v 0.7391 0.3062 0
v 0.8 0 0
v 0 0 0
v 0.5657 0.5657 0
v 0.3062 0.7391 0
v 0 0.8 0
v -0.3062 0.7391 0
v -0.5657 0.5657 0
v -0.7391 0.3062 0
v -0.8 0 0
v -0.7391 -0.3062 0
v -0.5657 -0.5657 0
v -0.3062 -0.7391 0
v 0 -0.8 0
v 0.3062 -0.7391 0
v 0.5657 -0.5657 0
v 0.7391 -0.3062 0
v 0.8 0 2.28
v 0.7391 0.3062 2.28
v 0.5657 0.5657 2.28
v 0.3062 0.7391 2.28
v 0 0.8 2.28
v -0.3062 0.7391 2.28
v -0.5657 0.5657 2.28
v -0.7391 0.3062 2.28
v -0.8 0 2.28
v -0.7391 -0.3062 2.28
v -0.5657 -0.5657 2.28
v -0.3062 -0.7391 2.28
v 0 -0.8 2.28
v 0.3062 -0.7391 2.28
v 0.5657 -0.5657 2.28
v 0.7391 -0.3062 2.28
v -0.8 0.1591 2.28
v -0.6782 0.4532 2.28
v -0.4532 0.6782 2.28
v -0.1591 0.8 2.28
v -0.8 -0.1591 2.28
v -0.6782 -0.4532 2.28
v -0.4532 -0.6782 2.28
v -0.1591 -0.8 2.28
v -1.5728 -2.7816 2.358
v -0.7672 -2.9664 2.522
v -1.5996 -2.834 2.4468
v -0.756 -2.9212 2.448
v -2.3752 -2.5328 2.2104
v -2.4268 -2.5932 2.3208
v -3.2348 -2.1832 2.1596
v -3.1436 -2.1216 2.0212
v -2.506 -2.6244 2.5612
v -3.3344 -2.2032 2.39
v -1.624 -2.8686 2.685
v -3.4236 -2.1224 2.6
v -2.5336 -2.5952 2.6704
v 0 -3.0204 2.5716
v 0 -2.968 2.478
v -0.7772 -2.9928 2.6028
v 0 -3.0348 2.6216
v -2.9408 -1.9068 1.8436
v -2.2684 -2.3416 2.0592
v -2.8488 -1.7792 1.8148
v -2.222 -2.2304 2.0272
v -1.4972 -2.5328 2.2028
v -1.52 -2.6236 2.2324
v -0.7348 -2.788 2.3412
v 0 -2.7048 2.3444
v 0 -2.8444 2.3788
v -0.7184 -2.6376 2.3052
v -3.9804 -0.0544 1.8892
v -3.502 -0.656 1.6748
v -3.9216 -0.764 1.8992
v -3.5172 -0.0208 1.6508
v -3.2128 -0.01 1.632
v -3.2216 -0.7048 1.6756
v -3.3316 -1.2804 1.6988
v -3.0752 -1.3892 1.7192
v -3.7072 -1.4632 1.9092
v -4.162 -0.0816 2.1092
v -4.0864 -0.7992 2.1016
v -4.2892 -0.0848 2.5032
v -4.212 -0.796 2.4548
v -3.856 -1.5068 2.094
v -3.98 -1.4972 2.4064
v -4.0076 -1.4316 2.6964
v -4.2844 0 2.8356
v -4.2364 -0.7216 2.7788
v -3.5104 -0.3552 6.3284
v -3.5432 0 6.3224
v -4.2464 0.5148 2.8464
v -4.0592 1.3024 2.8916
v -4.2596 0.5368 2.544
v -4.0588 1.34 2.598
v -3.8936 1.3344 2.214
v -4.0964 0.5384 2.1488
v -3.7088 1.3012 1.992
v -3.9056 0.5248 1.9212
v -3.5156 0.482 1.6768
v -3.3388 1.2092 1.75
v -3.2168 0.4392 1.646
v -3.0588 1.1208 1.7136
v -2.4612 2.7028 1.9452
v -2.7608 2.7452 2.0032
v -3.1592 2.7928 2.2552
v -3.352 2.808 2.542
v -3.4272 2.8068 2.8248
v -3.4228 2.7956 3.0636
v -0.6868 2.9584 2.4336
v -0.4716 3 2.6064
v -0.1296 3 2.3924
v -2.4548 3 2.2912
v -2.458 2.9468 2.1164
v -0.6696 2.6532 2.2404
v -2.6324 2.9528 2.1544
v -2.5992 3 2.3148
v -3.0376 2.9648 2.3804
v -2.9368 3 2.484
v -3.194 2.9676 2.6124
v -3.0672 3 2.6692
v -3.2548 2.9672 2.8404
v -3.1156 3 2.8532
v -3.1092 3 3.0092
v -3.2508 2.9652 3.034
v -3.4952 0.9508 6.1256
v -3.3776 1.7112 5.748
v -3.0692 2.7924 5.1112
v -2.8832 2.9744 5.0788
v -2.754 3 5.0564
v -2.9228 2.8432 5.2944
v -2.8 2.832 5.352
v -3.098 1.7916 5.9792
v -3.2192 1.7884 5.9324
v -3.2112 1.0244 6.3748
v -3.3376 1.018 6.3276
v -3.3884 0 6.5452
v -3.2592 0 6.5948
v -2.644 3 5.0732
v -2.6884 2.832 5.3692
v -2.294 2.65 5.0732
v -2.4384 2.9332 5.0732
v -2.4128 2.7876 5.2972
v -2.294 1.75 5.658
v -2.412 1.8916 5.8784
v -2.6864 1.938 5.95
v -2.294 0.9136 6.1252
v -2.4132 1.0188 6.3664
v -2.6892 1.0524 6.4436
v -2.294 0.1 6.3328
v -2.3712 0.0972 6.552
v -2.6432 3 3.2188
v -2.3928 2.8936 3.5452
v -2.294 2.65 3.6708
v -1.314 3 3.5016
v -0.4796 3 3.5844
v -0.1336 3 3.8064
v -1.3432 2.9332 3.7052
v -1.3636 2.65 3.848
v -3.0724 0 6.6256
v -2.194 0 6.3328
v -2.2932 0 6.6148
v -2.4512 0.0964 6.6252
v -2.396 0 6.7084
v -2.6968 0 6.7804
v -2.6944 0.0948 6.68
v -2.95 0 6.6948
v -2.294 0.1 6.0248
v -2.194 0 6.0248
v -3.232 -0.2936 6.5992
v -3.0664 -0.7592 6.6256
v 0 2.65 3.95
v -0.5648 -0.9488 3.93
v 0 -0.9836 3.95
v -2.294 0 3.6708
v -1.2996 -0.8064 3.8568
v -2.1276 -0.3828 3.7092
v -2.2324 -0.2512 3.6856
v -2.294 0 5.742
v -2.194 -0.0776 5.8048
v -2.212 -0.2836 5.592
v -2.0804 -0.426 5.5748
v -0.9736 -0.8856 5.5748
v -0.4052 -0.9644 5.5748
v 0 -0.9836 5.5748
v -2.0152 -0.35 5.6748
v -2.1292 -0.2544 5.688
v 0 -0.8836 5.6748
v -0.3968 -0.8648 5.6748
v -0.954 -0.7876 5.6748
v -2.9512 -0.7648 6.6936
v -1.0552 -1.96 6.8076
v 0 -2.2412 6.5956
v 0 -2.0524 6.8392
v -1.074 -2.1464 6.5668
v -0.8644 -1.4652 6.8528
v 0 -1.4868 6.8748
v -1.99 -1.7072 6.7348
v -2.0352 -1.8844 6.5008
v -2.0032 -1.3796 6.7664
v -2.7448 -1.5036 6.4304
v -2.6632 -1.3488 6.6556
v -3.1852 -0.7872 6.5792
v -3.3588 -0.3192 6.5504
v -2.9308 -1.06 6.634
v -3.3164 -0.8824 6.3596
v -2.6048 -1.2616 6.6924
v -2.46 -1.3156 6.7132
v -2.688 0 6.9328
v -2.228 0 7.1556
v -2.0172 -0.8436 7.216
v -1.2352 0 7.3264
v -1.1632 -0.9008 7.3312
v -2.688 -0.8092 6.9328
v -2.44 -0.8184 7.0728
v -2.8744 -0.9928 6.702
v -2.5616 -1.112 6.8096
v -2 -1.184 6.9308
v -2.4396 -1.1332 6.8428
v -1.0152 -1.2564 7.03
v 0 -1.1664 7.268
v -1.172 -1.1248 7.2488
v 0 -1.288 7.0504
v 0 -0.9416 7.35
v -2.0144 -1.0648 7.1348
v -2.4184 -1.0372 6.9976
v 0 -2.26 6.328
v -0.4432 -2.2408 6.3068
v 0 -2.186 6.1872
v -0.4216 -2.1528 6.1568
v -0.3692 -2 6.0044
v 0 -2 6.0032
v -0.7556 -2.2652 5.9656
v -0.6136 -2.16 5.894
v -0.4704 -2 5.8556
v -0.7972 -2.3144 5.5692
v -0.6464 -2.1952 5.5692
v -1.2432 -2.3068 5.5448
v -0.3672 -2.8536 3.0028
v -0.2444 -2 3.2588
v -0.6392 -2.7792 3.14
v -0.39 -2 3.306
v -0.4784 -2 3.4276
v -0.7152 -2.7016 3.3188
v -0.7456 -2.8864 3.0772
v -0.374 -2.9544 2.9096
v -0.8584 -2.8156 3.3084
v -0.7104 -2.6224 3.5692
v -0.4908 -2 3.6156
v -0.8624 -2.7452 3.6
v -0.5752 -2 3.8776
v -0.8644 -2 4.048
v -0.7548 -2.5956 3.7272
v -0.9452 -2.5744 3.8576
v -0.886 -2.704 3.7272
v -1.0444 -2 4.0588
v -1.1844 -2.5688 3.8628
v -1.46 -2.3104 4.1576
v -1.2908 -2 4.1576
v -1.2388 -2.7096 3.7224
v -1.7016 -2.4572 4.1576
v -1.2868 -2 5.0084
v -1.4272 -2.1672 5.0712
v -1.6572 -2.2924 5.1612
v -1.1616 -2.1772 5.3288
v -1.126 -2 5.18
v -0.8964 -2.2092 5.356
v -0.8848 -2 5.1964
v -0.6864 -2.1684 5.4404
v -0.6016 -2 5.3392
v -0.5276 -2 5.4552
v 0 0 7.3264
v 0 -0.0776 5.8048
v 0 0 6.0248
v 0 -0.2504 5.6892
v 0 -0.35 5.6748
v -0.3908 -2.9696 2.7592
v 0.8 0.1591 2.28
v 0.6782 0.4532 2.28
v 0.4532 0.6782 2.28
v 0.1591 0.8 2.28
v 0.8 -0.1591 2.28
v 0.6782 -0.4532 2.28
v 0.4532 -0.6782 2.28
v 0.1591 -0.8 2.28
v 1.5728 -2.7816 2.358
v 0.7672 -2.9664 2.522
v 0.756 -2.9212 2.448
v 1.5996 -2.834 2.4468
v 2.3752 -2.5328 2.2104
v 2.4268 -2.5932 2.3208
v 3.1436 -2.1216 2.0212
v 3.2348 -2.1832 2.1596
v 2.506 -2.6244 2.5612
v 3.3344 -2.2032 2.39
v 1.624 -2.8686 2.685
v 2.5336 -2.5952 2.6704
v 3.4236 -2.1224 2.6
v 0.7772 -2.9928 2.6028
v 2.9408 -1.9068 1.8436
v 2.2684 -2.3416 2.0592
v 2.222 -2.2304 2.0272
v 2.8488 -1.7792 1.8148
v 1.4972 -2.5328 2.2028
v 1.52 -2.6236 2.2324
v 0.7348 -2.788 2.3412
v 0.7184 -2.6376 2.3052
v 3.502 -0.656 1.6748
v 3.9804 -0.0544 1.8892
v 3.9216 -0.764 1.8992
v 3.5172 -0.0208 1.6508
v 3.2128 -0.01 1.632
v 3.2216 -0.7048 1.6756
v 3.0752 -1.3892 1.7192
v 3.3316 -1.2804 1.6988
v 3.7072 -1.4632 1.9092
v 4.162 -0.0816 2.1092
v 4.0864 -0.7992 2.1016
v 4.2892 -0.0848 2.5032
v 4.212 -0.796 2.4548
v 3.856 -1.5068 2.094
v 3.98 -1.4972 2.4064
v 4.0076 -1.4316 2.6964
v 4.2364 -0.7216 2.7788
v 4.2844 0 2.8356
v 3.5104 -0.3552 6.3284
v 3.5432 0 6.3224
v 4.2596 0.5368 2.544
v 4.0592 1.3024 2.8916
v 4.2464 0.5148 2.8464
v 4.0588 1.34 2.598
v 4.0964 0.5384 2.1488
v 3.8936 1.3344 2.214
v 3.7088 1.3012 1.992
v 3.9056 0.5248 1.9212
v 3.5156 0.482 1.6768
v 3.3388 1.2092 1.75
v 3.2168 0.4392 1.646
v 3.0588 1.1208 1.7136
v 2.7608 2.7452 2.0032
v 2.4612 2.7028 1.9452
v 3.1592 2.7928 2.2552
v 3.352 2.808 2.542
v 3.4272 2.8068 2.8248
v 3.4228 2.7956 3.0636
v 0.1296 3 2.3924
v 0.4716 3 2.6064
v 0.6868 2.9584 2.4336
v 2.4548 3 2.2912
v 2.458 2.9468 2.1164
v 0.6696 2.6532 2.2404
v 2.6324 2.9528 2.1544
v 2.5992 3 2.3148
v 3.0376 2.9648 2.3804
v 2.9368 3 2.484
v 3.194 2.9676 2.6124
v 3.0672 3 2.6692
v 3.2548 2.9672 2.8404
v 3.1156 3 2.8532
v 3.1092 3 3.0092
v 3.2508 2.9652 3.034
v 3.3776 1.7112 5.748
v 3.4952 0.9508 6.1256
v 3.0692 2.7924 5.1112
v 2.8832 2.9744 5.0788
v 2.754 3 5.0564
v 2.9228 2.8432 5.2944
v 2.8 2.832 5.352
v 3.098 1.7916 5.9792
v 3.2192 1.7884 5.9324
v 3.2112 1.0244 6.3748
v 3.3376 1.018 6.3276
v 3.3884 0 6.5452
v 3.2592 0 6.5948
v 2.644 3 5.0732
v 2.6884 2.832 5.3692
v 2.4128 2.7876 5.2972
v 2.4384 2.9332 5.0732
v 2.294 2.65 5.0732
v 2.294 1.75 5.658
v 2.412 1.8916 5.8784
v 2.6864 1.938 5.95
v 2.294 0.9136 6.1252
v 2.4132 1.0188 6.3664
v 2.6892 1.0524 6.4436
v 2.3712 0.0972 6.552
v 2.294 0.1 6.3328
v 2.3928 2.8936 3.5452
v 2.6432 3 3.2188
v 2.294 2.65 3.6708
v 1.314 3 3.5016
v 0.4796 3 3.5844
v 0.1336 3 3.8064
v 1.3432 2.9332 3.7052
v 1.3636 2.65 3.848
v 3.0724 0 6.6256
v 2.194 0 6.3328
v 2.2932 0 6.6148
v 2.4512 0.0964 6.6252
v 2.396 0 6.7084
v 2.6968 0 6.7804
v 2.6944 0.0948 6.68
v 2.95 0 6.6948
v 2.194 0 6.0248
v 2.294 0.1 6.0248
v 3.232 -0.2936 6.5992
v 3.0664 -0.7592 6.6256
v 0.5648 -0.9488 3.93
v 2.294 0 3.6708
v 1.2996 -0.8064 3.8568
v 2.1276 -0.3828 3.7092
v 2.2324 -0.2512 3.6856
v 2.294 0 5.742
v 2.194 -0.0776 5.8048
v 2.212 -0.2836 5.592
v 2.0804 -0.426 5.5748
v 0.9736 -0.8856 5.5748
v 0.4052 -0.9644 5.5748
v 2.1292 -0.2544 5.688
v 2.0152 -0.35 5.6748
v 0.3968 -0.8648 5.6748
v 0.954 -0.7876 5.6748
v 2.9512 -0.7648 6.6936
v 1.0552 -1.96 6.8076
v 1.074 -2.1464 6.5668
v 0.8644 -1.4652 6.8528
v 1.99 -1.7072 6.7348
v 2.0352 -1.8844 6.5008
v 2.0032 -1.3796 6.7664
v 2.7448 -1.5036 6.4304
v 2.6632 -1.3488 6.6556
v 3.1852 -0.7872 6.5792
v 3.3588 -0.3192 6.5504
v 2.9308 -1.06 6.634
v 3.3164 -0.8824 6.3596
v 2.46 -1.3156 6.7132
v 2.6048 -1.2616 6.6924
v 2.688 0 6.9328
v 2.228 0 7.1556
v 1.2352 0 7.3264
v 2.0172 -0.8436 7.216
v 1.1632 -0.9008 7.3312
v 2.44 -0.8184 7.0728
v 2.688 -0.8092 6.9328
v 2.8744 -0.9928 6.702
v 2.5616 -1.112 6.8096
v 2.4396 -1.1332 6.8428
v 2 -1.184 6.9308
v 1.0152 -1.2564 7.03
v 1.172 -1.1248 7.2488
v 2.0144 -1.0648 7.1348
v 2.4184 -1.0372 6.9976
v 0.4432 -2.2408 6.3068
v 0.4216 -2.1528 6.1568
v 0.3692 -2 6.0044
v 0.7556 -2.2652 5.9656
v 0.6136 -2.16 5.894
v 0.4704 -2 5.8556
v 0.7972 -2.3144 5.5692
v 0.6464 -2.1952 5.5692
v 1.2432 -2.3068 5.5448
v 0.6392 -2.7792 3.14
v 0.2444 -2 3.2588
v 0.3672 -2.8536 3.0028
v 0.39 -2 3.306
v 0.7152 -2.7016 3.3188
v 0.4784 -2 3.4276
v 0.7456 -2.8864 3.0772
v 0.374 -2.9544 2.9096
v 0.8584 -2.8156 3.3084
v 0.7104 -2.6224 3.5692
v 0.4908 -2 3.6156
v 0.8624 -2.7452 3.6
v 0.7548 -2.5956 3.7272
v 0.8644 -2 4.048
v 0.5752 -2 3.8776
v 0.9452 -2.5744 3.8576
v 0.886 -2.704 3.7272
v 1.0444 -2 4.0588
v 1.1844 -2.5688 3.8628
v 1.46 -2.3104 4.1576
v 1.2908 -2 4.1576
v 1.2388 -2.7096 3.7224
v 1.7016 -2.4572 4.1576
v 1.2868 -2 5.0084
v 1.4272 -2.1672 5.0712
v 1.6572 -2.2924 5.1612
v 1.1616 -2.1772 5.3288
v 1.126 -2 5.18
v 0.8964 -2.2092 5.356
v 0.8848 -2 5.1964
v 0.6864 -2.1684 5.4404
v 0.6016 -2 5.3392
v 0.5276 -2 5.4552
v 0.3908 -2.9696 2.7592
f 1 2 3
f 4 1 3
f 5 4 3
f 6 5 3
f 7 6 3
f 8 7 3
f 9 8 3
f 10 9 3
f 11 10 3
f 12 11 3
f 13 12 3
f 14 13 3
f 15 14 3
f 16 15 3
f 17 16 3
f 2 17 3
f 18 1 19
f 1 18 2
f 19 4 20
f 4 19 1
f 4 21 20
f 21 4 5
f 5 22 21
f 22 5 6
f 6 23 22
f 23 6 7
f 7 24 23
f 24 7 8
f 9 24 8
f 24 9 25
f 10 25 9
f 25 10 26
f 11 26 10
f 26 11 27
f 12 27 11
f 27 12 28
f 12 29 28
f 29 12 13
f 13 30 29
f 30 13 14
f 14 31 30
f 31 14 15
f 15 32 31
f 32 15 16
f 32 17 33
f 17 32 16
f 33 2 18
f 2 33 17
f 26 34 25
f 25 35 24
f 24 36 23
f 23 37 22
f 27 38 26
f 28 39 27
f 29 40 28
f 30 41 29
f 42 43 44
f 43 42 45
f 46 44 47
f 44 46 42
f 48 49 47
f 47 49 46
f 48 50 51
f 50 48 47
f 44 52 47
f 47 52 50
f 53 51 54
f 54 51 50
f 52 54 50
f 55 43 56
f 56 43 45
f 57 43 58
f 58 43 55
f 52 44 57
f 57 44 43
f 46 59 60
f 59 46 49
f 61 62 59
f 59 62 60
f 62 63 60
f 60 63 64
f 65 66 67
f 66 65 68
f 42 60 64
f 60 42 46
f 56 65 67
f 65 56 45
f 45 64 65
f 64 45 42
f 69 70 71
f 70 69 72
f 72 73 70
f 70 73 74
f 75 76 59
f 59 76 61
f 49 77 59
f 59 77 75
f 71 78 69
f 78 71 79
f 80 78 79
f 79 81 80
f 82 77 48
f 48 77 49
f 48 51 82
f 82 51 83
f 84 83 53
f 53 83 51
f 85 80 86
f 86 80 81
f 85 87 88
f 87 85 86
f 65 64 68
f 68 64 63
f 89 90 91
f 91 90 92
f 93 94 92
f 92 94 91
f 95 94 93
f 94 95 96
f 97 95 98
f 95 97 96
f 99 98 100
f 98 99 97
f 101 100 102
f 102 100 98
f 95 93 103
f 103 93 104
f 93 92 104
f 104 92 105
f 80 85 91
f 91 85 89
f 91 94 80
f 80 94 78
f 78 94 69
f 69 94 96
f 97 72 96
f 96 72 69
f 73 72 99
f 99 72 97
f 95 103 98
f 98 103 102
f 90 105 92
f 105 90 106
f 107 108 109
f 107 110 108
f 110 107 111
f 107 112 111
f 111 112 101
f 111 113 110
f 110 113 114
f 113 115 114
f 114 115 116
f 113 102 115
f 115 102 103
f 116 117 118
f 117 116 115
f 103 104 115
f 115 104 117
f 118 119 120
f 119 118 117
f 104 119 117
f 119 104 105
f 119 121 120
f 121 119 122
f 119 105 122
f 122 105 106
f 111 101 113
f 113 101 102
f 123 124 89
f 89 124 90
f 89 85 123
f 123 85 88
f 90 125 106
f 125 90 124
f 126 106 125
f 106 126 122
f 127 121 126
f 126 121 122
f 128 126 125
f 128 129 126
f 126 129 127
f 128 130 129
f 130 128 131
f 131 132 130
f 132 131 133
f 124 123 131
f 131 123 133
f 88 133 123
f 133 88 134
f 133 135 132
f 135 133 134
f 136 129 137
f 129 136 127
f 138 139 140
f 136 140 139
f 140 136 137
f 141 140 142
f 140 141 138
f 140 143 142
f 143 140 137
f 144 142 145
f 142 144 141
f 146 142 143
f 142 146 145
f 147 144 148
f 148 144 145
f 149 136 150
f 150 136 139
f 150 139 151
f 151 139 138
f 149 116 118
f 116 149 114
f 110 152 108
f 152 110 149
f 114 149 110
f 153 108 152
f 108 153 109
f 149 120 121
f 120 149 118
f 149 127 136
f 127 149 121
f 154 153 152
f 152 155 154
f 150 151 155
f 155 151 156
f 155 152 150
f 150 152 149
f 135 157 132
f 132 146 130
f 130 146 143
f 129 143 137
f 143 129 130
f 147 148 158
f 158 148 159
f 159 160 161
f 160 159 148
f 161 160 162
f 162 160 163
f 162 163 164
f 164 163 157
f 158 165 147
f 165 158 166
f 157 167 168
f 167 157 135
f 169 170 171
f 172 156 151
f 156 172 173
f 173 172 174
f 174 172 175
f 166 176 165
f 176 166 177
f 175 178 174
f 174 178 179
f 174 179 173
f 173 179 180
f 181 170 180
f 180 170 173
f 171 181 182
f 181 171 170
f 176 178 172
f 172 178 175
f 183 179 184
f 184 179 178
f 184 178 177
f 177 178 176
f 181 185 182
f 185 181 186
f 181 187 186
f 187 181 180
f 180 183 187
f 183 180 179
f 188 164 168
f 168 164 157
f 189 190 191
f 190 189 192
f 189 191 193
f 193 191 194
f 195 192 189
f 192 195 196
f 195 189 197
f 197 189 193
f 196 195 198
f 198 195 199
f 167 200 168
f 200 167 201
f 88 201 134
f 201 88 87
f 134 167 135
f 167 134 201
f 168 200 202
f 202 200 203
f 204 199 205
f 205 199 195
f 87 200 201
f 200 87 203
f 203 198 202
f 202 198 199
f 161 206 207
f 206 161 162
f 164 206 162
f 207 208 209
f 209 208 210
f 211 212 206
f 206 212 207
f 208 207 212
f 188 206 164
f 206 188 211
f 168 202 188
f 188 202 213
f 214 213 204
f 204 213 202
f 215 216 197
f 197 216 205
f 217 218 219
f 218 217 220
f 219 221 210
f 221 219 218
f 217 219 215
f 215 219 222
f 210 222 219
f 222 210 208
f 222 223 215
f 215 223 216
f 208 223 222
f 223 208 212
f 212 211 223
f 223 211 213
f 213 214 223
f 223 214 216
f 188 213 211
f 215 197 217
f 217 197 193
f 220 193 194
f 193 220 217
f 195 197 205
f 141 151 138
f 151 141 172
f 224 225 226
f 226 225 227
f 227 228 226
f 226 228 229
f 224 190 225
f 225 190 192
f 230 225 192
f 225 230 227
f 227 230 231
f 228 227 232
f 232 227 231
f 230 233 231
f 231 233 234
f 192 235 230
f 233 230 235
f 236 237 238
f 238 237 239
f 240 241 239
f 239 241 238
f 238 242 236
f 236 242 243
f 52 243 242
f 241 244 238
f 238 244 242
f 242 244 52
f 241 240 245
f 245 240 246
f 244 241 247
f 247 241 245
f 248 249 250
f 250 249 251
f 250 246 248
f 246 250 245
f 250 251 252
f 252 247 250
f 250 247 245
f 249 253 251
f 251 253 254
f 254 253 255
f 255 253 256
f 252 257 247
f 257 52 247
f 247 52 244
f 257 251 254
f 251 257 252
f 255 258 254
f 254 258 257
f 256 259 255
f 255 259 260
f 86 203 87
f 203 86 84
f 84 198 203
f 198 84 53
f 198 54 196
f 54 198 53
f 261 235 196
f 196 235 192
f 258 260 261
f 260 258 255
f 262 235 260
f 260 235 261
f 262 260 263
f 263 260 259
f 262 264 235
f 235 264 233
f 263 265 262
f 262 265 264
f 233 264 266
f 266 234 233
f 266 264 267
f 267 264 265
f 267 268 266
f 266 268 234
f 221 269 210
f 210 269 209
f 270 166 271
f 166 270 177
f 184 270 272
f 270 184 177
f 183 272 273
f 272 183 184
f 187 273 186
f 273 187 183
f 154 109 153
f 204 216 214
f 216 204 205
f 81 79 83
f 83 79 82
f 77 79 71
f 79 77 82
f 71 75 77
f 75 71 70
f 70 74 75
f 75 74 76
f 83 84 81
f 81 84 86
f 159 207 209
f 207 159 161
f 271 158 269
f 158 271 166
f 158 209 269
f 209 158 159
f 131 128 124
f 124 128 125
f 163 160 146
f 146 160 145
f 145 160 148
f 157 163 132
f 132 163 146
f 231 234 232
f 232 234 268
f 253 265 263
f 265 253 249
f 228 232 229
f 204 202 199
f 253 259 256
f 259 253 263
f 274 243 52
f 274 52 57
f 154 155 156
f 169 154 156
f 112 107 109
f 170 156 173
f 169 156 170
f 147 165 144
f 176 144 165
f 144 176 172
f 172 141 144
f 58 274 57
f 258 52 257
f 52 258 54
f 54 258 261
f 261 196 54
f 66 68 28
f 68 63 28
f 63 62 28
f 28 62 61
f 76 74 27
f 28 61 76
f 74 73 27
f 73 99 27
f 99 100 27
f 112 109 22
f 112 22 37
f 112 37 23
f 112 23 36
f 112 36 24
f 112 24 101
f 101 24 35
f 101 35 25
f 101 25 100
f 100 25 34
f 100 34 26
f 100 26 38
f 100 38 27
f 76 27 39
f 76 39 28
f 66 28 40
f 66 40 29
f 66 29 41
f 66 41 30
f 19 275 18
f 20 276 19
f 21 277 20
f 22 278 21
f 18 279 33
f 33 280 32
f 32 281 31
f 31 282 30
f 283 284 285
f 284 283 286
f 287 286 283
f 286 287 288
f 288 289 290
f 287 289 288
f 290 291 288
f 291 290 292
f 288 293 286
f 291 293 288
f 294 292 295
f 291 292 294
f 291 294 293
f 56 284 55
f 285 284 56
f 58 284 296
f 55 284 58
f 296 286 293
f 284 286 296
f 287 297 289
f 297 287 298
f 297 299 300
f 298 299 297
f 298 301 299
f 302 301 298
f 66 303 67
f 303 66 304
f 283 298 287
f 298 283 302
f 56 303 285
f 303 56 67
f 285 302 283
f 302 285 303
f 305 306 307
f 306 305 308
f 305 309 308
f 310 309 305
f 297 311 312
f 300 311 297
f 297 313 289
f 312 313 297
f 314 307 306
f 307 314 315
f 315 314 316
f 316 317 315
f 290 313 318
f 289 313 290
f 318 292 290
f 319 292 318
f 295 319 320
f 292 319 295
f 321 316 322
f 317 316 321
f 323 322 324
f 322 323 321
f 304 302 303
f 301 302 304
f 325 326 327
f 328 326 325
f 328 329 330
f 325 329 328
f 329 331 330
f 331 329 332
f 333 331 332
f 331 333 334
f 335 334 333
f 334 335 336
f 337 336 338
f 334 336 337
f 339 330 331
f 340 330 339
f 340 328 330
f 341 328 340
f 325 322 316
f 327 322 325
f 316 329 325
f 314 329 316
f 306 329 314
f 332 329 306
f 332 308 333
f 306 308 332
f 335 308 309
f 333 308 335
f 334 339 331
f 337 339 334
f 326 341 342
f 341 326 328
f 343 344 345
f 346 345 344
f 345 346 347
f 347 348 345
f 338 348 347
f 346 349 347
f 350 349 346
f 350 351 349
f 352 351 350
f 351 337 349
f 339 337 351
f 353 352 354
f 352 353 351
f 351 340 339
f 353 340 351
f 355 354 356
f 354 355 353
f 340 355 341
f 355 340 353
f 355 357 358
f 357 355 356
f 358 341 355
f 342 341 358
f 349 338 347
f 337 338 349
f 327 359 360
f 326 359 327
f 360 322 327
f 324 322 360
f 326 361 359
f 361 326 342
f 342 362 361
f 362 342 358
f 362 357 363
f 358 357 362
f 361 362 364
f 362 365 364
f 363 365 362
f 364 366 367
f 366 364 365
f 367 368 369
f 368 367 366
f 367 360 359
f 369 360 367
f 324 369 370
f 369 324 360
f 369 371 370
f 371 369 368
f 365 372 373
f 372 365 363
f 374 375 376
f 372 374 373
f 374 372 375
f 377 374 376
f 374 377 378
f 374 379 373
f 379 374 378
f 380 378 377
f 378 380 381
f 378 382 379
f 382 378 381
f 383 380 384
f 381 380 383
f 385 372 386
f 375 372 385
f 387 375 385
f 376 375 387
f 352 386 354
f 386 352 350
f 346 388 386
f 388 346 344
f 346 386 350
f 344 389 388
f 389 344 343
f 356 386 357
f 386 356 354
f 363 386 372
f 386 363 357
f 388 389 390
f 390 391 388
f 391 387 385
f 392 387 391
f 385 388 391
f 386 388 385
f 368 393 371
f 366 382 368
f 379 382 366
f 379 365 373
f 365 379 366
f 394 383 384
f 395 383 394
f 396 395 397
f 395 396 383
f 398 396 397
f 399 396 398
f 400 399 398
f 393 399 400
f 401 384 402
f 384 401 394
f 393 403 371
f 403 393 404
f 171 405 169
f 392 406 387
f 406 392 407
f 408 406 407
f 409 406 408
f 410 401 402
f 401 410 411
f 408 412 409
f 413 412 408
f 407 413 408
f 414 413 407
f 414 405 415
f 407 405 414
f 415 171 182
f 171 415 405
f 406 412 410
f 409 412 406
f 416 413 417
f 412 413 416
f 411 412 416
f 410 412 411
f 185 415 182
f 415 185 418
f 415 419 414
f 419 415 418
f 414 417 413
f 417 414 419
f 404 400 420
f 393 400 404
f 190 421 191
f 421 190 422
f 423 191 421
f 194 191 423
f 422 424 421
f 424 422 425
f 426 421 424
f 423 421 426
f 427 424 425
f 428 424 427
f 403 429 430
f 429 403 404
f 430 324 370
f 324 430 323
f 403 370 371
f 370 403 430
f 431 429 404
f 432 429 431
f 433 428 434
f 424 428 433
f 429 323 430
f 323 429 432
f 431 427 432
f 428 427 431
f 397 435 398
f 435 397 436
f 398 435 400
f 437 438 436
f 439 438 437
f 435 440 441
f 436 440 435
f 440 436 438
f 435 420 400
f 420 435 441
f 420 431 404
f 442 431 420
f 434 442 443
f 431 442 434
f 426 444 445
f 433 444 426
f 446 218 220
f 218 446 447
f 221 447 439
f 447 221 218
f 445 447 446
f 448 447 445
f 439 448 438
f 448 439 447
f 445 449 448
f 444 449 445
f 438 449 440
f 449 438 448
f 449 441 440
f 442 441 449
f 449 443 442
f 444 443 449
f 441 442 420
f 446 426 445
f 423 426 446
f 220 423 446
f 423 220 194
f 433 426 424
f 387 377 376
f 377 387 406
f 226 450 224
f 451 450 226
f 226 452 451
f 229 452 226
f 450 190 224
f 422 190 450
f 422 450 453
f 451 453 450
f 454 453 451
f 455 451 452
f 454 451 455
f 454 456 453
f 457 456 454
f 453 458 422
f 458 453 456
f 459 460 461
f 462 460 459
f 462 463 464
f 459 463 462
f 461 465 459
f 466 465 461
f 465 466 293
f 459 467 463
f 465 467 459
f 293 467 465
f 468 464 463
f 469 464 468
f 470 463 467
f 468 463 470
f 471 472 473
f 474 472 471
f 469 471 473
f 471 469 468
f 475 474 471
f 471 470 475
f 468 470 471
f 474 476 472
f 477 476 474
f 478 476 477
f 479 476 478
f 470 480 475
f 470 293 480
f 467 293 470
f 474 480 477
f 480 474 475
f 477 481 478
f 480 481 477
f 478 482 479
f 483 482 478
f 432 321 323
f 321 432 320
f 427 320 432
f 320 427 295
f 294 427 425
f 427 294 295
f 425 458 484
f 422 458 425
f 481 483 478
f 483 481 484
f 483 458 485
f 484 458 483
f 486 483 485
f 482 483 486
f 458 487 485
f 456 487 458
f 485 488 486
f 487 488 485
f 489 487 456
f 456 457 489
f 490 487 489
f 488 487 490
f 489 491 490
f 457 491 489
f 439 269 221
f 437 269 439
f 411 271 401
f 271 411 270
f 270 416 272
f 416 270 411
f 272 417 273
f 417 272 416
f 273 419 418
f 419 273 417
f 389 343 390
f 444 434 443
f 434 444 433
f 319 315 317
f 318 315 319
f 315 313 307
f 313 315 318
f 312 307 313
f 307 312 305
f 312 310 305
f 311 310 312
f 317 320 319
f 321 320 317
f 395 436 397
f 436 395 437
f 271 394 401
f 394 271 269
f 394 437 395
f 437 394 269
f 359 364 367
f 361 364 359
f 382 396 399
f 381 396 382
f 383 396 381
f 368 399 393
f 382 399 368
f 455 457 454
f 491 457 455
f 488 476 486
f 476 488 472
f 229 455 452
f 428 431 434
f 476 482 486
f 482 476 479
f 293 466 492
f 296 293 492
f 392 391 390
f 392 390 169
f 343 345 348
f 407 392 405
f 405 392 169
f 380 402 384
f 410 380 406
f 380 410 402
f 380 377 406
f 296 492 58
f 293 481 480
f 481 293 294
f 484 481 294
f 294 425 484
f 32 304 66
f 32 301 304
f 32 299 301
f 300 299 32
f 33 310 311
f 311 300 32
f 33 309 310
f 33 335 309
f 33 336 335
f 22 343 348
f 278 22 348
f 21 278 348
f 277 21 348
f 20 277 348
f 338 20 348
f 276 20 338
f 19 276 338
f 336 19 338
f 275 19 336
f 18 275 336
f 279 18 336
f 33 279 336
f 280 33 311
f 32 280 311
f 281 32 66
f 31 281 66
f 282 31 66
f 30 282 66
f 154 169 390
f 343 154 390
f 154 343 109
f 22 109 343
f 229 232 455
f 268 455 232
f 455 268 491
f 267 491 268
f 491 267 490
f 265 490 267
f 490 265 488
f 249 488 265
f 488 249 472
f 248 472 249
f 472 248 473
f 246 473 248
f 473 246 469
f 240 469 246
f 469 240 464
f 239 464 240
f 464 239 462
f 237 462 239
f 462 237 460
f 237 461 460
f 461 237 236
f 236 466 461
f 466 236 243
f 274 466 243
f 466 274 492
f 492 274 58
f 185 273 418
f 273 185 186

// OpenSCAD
use <../lib.scad>
use <../p/4-4cylc.scad>
use <s/98393hs01.scad>
function ldraw_lib__98393h() = [
// 0 Figure Friends Medical Nurse Hat
// 0 Name: 98393h.dat
// 0 Author: Takeshi Takahashi [RainbowDolphin]
// 0 !LDRAW_ORG Part UPDATE 2025-03
// 0 !LICENSE Licensed under CC BY 4.0 : see CAreadme.txt
// 
// 0 BFC CERTIFY CCW
  [0,"BFC","CERTIFY"],
  [0,"BFC","CCW"],
// 
// 0 !HISTORY 2021-03-20 {LEGO/Unity Microgame} Original part shape
// 0 !HISTORY 2021-03-20 [RainbowDolphin] File preparation for LDraw Parts Tracker
// 0 !HISTORY 2025-03-30 [OrionP] Official Update 2025-03
// 
// 1 16 0 0 0 2 0 0 0 -5.7 0 0 0 2 4-4cylc.dat
  [1,16,0,0,0,2,0,0,0,-5.7,0,0,0,2, ldraw_lib__4_4cylc()],
// 1 16 0 0 0 1 0 0 0 1 0 0 0 1 s\98393hs01.dat
  [1,16,0,0,0,1,0,0,0,1,0,0,0,1, ldraw_lib__s__98393hs01()],
// 1 16 0 0 0 -1 0 0 0 1 0 0 0 1 s\98393hs01.dat
  [1,16,0,0,0,-1,0,0,0,1,0,0,0,1, ldraw_lib__s__98393hs01()],
// 
// 3 16 -.334 -9.516 7.5 0 -9.875 6.625 .334 -9.516 7.5
  [3,16,-.334,-9.516,7.5,0,-9.875,6.625,.334,-9.516,7.5],
// 4 16 -.334 -9.516 7.5 .334 -9.516 7.5 .324 -5.981 7.5 -.324 -5.981 7.5
  [4,16,-.334,-9.516,7.5,.334,-9.516,7.5,.324,-5.981,7.5,-.324,-5.981,7.5],
// 3 16 0 -5.7 2 -.324 -5.981 7.5 .324 -5.981 7.5
  [3,16,0,-5.7,2,-.324,-5.981,7.5,.324,-5.981,7.5],
// 3 16 0 -15.008 -5 -1.176 -14.639 -5 1.176 -14.639 -5
  [3,16,0,-15.008,-5,-1.176,-14.639,-5,1.176,-14.639,-5],
// 4 16 1.319 -13.638 -5 1.176 -14.639 -5 -1.176 -14.639 -5 -1.319 -13.638 -5
  [4,16,1.319,-13.638,-5,1.176,-14.639,-5,-1.176,-14.639,-5,-1.319,-13.638,-5],
// 4 16 1.504 -13.348 -5 1.319 -13.638 -5 -1.319 -13.638 -5 -1.504 -13.348 -5
  [4,16,1.504,-13.348,-5,1.319,-13.638,-5,-1.319,-13.638,-5,-1.504,-13.348,-5],
// 4 16 2.212 -12.991 -5 1.504 -13.348 -5 -1.504 -13.348 -5 -2.212 -12.991 -5
  [4,16,2.212,-12.991,-5,1.504,-13.348,-5,-1.504,-13.348,-5,-2.212,-12.991,-5],
// 4 16 2.161 -10.12 -5 2.212 -12.991 -5 -2.212 -12.991 -5 -2.161 -10.12 -5
  [4,16,2.161,-10.12,-5,2.212,-12.991,-5,-2.212,-12.991,-5,-2.161,-10.12,-5],
// 4 16 1.438 -9.694 -5 2.161 -10.12 -5 -2.161 -10.12 -5 -1.438 -9.694 -5
  [4,16,1.438,-9.694,-5,2.161,-10.12,-5,-2.161,-10.12,-5,-1.438,-9.694,-5],
// 4 16 1.227 -9.039 -5 1.438 -9.694 -5 -1.438 -9.694 -5 -1.227 -9.039 -5
  [4,16,1.227,-9.039,-5,1.438,-9.694,-5,-1.438,-9.694,-5,-1.227,-9.039,-5],
// 4 16 1.196 -8.569 -5 1.227 -9.039 -5 -1.227 -9.039 -5 -1.196 -8.569 -5
  [4,16,1.196,-8.569,-5,1.227,-9.039,-5,-1.227,-9.039,-5,-1.196,-8.569,-5],
// 4 16 .975 -8.265 -5 1.196 -8.569 -5 -1.196 -8.569 -5 -.975 -8.265 -5
  [4,16,.975,-8.265,-5,1.196,-8.569,-5,-1.196,-8.569,-5,-.975,-8.265,-5],
// 4 16 -.975 -8.265 -5 -.611 -8.147 -5 .611 -8.147 -5 .975 -8.265 -5
  [4,16,-.975,-8.265,-5,-.611,-8.147,-5,.611,-8.147,-5,.975,-8.265,-5],
// 4 16 .918 -7.507 -7.134 .611 -8.147 -5 -.611 -8.147 -5 -.918 -7.507 -7.134
  [4,16,.918,-7.507,-7.134,.611,-8.147,-5,-.611,-8.147,-5,-.918,-7.507,-7.134],
// 4 16 .935 -7.274 -7.386 .918 -7.507 -7.134 -.918 -7.507 -7.134 -.935 -7.274 -7.386
  [4,16,.935,-7.274,-7.386,.918,-7.507,-7.134,-.918,-7.507,-7.134,-.935,-7.274,-7.386],
// 4 16 .977 -6.898 -7.424 .935 -7.274 -7.386 -.935 -7.274 -7.386 -.977 -6.898 -7.424
  [4,16,.977,-6.898,-7.424,.935,-7.274,-7.386,-.935,-7.274,-7.386,-.977,-6.898,-7.424],
// 3 16 .977 -6.898 -7.424 -.977 -6.898 -7.424 0 -6.554 -7.587
  [3,16,.977,-6.898,-7.424,-.977,-6.898,-7.424,0,-6.554,-7.587],
// 4 16 0 -14.187 -.875 .992 -14.187 -2.162 0 -14.187 -2.209 -.992 -14.187 -2.162
  [4,16,0,-14.187,-.875,.992,-14.187,-2.162,0,-14.187,-2.209,-.992,-14.187,-2.162],
// 5 24 0 -6.429 -7.551 0 -6.554 -7.587 1.918 -6.305 -7.416 -1.918 -6.305 -7.416
  [5,24,0,-6.429,-7.551,0,-6.554,-7.587,1.918,-6.305,-7.416,-1.918,-6.305,-7.416],
// 5 24 0 -6.195 -7.42 0 -6.429 -7.551 1.918 -6.305 -7.416 -1.918 -6.305 -7.416
  [5,24,0,-6.195,-7.42,0,-6.429,-7.551,1.918,-6.305,-7.416,-1.918,-6.305,-7.416],
// 5 24 -.611 -8.147 -5 -.975 -8.265 -5 .611 -8.147 -5 -1.118 -8.068 -5.19
  [5,24,-.611,-8.147,-5,-.975,-8.265,-5,.611,-8.147,-5,-1.118,-8.068,-5.19],
// 5 24 -2.212 -12.991 -5 -1.504 -13.348 -5 2.212 -12.991 -5 -1.686 -13.509 -5.19
  [5,24,-2.212,-12.991,-5,-1.504,-13.348,-5,2.212,-12.991,-5,-1.686,-13.509,-5.19],
// 5 24 .918 -7.507 -7.134 -.918 -7.507 -7.134 .611 -8.147 -5 -.935 -7.274 -7.386
  [5,24,.918,-7.507,-7.134,-.918,-7.507,-7.134,.611,-8.147,-5,-.935,-7.274,-7.386],
// 5 24 0 -18.17 -2.916 0 -18.375 -2.354 2.908 -18.328 -2.252 -2.908 -18.328 -2.252
  [5,24,0,-18.17,-2.916,0,-18.375,-2.354,2.908,-18.328,-2.252,-2.908,-18.328,-2.252],
// 5 24 1.319 -13.638 -5 1.176 -14.639 -5 1.543 -13.735 -5.193 -1.176 -14.639 -5
  [5,24,1.319,-13.638,-5,1.176,-14.639,-5,1.543,-13.735,-5.193,-1.176,-14.639,-5],
// 5 24 .935 -7.274 -7.386 .918 -7.507 -7.134 1.864 -7.693 -7.216 -.918 -7.507 -7.134
  [5,24,.935,-7.274,-7.386,.918,-7.507,-7.134,1.864,-7.693,-7.216,-.918,-7.507,-7.134],
// 5 24 .977 -6.898 -7.424 .935 -7.274 -7.386 4.013 -6.827 -7.169 -.935 -7.274 -7.386
  [5,24,.977,-6.898,-7.424,.935,-7.274,-7.386,4.013,-6.827,-7.169,-.935,-7.274,-7.386],
// 5 24 -.324 -5.981 7.5 0 -5.7 2 -1.674 -5.601 6.633 .324 -5.981 7.5
  [5,24,-.324,-5.981,7.5,0,-5.7,2,-1.674,-5.601,6.633,.324,-5.981,7.5],
// 5 24 .324 -5.981 7.5 0 -5.7 2 1.674 -5.601 6.633 -.324 -5.981 7.5
  [5,24,.324,-5.981,7.5,0,-5.7,2,1.674,-5.601,6.633,-.324,-5.981,7.5],
// 5 24 .977 -6.898 -7.424 -.977 -6.898 -7.424 .935 -7.274 -7.386 0 -6.554 -7.587
  [5,24,.977,-6.898,-7.424,-.977,-6.898,-7.424,.935,-7.274,-7.386,0,-6.554,-7.587],
// 5 24 -.977 -6.898 -7.424 -.935 -7.274 -7.386 .977 -6.898 -7.424 -4.013 -6.827 -7.169
  [5,24,-.977,-6.898,-7.424,-.935,-7.274,-7.386,.977,-6.898,-7.424,-4.013,-6.827,-7.169],
// 5 24 -1.438 -9.694 -5 -2.161 -10.12 -5 1.438 -9.694 -5 -1.634 -9.552 -5.19
  [5,24,-1.438,-9.694,-5,-2.161,-10.12,-5,1.438,-9.694,-5,-1.634,-9.552,-5.19],
// 5 24 0 -17.098 -5.131 0 -17.187 -3.717 -2.161 -17.132 -3.663 2.161 -17.132 -3.663
  [5,24,0,-17.098,-5.131,0,-17.187,-3.717,-2.161,-17.132,-3.663,2.161,-17.132,-3.663],
// 5 24 0 -15.82 -5.65 0 -16.489 -5.603 1.108 -15.767 -5.602 -1.108 -15.767 -5.602
  [5,24,0,-15.82,-5.65,0,-16.489,-5.603,1.108,-15.767,-5.602,-1.108,-15.767,-5.602],
// 5 24 1.196 -8.569 -5 1.227 -9.039 -5 -1.227 -9.039 -5 1.473 -9.039 -5.207
  [5,24,1.196,-8.569,-5,1.227,-9.039,-5,-1.227,-9.039,-5,1.473,-9.039,-5.207],
// 5 24 .918 -7.507 -7.134 .611 -8.147 -5 1.598 -7.85 -6.948 -.611 -8.147 -5
  [5,24,.918,-7.507,-7.134,.611,-8.147,-5,1.598,-7.85,-6.948,-.611,-8.147,-5],
// 5 24 0 -6.554 -7.587 .977 -6.898 -7.424 1.943 -6.507 -7.482 -.977 -6.898 -7.424
  [5,24,0,-6.554,-7.587,.977,-6.898,-7.424,1.943,-6.507,-7.482,-.977,-6.898,-7.424],
// 5 24 -1.196 -8.569 -5 -1.227 -9.039 -5 1.196 -8.569 -5 -1.473 -9.039 -5.207
  [5,24,-1.196,-8.569,-5,-1.227,-9.039,-5,1.196,-8.569,-5,-1.473,-9.039,-5.207],
// 5 24 -1.319 -13.638 -5 -1.176 -14.639 -5 -1.543 -13.735 -5.193 1.319 -13.638 -5
  [5,24,-1.319,-13.638,-5,-1.176,-14.639,-5,-1.543,-13.735,-5.193,1.319,-13.638,-5],
// 5 24 0 -9.875 6.625 -.334 -9.516 7.5 .334 -9.516 7.5 -3.409 -9.62 6.625
  [5,24,0,-9.875,6.625,-.334,-9.516,7.5,.334,-9.516,7.5,-3.409,-9.62,6.625],
// 5 24 -.975 -8.265 -5 -1.196 -8.569 -5 -1.428 -8.494 -5.196 .975 -8.265 -5
  [5,24,-.975,-8.265,-5,-1.196,-8.569,-5,-1.428,-8.494,-5.196,.975,-8.265,-5],
// 5 24 .611 -8.147 -5 .975 -8.265 -5 -.975 -8.265 -5 1.118 -8.068 -5.19
  [5,24,.611,-8.147,-5,.975,-8.265,-5,-.975,-8.265,-5,1.118,-8.068,-5.19],
// 5 24 -1.504 -13.348 -5 -1.319 -13.638 -5 1.504 -13.348 -5 -1.543 -13.735 -5.193
  [5,24,-1.504,-13.348,-5,-1.319,-13.638,-5,1.504,-13.348,-5,-1.543,-13.735,-5.193],
// 5 24 1.504 -13.348 -5 1.319 -13.638 -5 1.543 -13.735 -5.193 -1.319 -13.638 -5
  [5,24,1.504,-13.348,-5,1.319,-13.638,-5,1.543,-13.735,-5.193,-1.319,-13.638,-5],
// 5 24 0 -9.875 6.625 .334 -9.516 7.5 3.409 -9.62 6.625 -.334 -9.516 7.5
  [5,24,0,-9.875,6.625,.334,-9.516,7.5,3.409,-9.62,6.625,-.334,-9.516,7.5],
// 5 24 0 -17.626 -3.22 0 -18.17 -2.916 2.93 -18.122 -2.812 -2.93 -18.122 -2.812
  [5,24,0,-17.626,-3.22,0,-18.17,-2.916,2.93,-18.122,-2.812,-2.93,-18.122,-2.812],
// 5 24 0 -15.468 -5.465 0 -15.82 -5.65 1.108 -15.767 -5.602 -1.108 -15.767 -5.602
  [5,24,0,-15.468,-5.465,0,-15.82,-5.65,1.108,-15.767,-5.602,-1.108,-15.767,-5.602],
// 5 24 1.227 -9.039 -5 1.438 -9.694 -5 -1.438 -9.694 -5 1.634 -9.552 -5.19
  [5,24,1.227,-9.039,-5,1.438,-9.694,-5,-1.438,-9.694,-5,1.634,-9.552,-5.19],
// 5 24 -.935 -7.274 -7.386 .935 -7.274 -7.386 .918 -7.507 -7.134 -.977 -6.898 -7.424
  [5,24,-.935,-7.274,-7.386,.935,-7.274,-7.386,.918,-7.507,-7.134,-.977,-6.898,-7.424],
// 5 24 0 -18.375 -2.354 0 -18.316 0 2.908 -18.328 -2.252 -2.908 -18.328 -2.252
  [5,24,0,-18.375,-2.354,0,-18.316,0,2.908,-18.328,-2.252,-2.908,-18.328,-2.252],
// 5 24 0 -15.008 -5 0 -15.237 -5.151 .921 -15.239 -5.147 -.921 -15.239 -5.147
  [5,24,0,-15.008,-5,0,-15.237,-5.151,.921,-15.239,-5.147,-.921,-15.239,-5.147],
// 5 24 0 -17.187 -3.717 0 -17.626 -3.22 2.538 -17.575 -3.141 -2.538 -17.575 -3.141
  [5,24,0,-17.187,-3.717,0,-17.626,-3.22,2.538,-17.575,-3.141,-2.538,-17.575,-3.141],
// 5 24 1.438 -9.694 -5 2.161 -10.12 -5 -2.161 -10.12 -5 1.634 -9.552 -5.19
  [5,24,1.438,-9.694,-5,2.161,-10.12,-5,-2.161,-10.12,-5,1.634,-9.552,-5.19],
// 5 24 -.918 -7.507 -7.134 -.611 -8.147 -5 .918 -7.507 -7.134 -1.598 -7.85 -6.948
  [5,24,-.918,-7.507,-7.134,-.611,-8.147,-5,.918,-7.507,-7.134,-1.598,-7.85,-6.948],
// 5 24 2.212 -12.991 -5 1.504 -13.348 -5 -1.504 -13.348 -5 1.686 -13.509 -5.19
  [5,24,2.212,-12.991,-5,1.504,-13.348,-5,-1.504,-13.348,-5,1.686,-13.509,-5.19],
// 5 24 0 -5.861 -6.762 0 -5.947 -7.111 -1.837 -5.853 -6.97 1.837 -5.853 -6.97
  [5,24,0,-5.861,-6.762,0,-5.947,-7.111,-1.837,-5.853,-6.97,1.837,-5.853,-6.97],
// 5 24 0 -16.489 -5.603 0 -17.098 -5.131 2.638 -17.019 -4.9 -2.638 -17.019 -4.9
  [5,24,0,-16.489,-5.603,0,-17.098,-5.131,2.638,-17.019,-4.9,-2.638,-17.019,-4.9],
// 5 24 -1.227 -9.039 -5 -1.438 -9.694 -5 -1.634 -9.552 -5.19 1.227 -9.039 -5
  [5,24,-1.227,-9.039,-5,-1.438,-9.694,-5,-1.634,-9.552,-5.19,1.227,-9.039,-5],
// 5 24 0 -6.554 -7.587 -.977 -6.898 -7.424 -1.943 -6.507 -7.482 .977 -6.898 -7.424
  [5,24,0,-6.554,-7.587,-.977,-6.898,-7.424,-1.943,-6.507,-7.482,.977,-6.898,-7.424],
// 5 24 .975 -8.265 -5 1.196 -8.569 -5 -1.196 -8.569 -5 1.428 -8.494 -5.196
  [5,24,.975,-8.265,-5,1.196,-8.569,-5,-1.196,-8.569,-5,1.428,-8.494,-5.196],
// 5 24 0 -5.947 -7.111 0 -6.195 -7.42 1.89 -6.12 -7.303 -1.89 -6.12 -7.303
  [5,24,0,-5.947,-7.111,0,-6.195,-7.42,1.89,-6.12,-7.303,-1.89,-6.12,-7.303],
// 5 24 0 -5.7 -2 0 -5.861 -6.762 .7654 -5.7 -1.8478 -.7654 -5.7 -1.8478
  [5,24,0,-5.7,-2,0,-5.861,-6.762,.7654,-5.7,-1.8478,-.7654,-5.7,-1.8478],
// 5 24 -.935 -7.274 -7.386 -.918 -7.507 -7.134 .935 -7.274 -7.386 -1.864 -7.693 -7.216
  [5,24,-.935,-7.274,-7.386,-.918,-7.507,-7.134,.935,-7.274,-7.386,-1.864,-7.693,-7.216],
// 5 24 0 -15.237 -5.151 0 -15.468 -5.465 -.921 -15.239 -5.147 .921 -15.239 -5.147
  [5,24,0,-15.237,-5.151,0,-15.468,-5.465,-.921,-15.239,-5.147,.921,-15.239,-5.147],
// 5 24 .334 -9.516 7.5 -.334 -9.516 7.5 -.324 -5.981 7.5 0 -9.875 6.625
  [5,24,.334,-9.516,7.5,-.334,-9.516,7.5,-.324,-5.981,7.5,0,-9.875,6.625],
// 5 24 .324 -5.981 7.5 -.324 -5.981 7.5 0 -5.7 2 -.334 -9.516 7.5
  [5,24,.324,-5.981,7.5,-.324,-5.981,7.5,0,-5.7,2,-.334,-9.516,7.5],
// 2 24 -.935 -7.274 -7.386 .935 -7.274 -7.386
  [2,24,-.935,-7.274,-7.386,.935,-7.274,-7.386],
// 2 24 -.611 -8.147 -5 .611 -8.147 -5
  [2,24,-.611,-8.147,-5,.611,-8.147,-5],
// 5 24 0 -9.875 -2.459 0 -9.875 6.625 -1.412 -9.825 -2.372 1.412 -9.825 -2.372
  [5,24,0,-9.875,-2.459,0,-9.875,6.625,-1.412,-9.825,-2.372,1.412,-9.825,-2.372],
// 5 24 0 -13.937 -2.459 0 -9.875 -2.459 1.412 -9.825 -2.372 -1.412 -9.825 -2.372
  [5,24,0,-13.937,-2.459,0,-9.875,-2.459,1.412,-9.825,-2.372,-1.412,-9.825,-2.372],
// 5 24 0 -14.187 -2.209 0 -13.937 -2.459 -1.013 -13.937 -2.411 1.013 -13.937 -2.411
  [5,24,0,-14.187,-2.209,0,-13.937,-2.459,-1.013,-13.937,-2.411,1.013,-13.937,-2.411],
// 5 24 .992 -14.187 -2.162 0 -14.187 -2.209 0 -13.937 -2.459 -.992 -14.187 -2.162
  [5,24,.992,-14.187,-2.162,0,-14.187,-2.209,0,-13.937,-2.459,-.992,-14.187,-2.162],
// 5 24 0 -14.187 -2.209 -.992 -14.187 -2.162 0 -14.187 -.875 0 -13.937 -2.459
  [5,24,0,-14.187,-2.209,-.992,-14.187,-2.162,0,-14.187,-.875,0,-13.937,-2.459],
// 5 24 0 -15.008 -5 0 -15.468 -5.465 .923 -15.011 -5 -.923 -15.011 -5
  [5,24,0,-15.008,-5,0,-15.468,-5.465,.923,-15.011,-5,-.923,-15.011,-5],
];
module ldraw_lib__98393h(step=0, col=false, unit=2/5, alt=false, line=0.2, solid=!$preview)
    makepoly(ldraw_lib__98393h(), step=step, col=col, unit=unit, alt=alt, line=line, solid=solid);
ldraw_lib__98393h(line=0.2);
